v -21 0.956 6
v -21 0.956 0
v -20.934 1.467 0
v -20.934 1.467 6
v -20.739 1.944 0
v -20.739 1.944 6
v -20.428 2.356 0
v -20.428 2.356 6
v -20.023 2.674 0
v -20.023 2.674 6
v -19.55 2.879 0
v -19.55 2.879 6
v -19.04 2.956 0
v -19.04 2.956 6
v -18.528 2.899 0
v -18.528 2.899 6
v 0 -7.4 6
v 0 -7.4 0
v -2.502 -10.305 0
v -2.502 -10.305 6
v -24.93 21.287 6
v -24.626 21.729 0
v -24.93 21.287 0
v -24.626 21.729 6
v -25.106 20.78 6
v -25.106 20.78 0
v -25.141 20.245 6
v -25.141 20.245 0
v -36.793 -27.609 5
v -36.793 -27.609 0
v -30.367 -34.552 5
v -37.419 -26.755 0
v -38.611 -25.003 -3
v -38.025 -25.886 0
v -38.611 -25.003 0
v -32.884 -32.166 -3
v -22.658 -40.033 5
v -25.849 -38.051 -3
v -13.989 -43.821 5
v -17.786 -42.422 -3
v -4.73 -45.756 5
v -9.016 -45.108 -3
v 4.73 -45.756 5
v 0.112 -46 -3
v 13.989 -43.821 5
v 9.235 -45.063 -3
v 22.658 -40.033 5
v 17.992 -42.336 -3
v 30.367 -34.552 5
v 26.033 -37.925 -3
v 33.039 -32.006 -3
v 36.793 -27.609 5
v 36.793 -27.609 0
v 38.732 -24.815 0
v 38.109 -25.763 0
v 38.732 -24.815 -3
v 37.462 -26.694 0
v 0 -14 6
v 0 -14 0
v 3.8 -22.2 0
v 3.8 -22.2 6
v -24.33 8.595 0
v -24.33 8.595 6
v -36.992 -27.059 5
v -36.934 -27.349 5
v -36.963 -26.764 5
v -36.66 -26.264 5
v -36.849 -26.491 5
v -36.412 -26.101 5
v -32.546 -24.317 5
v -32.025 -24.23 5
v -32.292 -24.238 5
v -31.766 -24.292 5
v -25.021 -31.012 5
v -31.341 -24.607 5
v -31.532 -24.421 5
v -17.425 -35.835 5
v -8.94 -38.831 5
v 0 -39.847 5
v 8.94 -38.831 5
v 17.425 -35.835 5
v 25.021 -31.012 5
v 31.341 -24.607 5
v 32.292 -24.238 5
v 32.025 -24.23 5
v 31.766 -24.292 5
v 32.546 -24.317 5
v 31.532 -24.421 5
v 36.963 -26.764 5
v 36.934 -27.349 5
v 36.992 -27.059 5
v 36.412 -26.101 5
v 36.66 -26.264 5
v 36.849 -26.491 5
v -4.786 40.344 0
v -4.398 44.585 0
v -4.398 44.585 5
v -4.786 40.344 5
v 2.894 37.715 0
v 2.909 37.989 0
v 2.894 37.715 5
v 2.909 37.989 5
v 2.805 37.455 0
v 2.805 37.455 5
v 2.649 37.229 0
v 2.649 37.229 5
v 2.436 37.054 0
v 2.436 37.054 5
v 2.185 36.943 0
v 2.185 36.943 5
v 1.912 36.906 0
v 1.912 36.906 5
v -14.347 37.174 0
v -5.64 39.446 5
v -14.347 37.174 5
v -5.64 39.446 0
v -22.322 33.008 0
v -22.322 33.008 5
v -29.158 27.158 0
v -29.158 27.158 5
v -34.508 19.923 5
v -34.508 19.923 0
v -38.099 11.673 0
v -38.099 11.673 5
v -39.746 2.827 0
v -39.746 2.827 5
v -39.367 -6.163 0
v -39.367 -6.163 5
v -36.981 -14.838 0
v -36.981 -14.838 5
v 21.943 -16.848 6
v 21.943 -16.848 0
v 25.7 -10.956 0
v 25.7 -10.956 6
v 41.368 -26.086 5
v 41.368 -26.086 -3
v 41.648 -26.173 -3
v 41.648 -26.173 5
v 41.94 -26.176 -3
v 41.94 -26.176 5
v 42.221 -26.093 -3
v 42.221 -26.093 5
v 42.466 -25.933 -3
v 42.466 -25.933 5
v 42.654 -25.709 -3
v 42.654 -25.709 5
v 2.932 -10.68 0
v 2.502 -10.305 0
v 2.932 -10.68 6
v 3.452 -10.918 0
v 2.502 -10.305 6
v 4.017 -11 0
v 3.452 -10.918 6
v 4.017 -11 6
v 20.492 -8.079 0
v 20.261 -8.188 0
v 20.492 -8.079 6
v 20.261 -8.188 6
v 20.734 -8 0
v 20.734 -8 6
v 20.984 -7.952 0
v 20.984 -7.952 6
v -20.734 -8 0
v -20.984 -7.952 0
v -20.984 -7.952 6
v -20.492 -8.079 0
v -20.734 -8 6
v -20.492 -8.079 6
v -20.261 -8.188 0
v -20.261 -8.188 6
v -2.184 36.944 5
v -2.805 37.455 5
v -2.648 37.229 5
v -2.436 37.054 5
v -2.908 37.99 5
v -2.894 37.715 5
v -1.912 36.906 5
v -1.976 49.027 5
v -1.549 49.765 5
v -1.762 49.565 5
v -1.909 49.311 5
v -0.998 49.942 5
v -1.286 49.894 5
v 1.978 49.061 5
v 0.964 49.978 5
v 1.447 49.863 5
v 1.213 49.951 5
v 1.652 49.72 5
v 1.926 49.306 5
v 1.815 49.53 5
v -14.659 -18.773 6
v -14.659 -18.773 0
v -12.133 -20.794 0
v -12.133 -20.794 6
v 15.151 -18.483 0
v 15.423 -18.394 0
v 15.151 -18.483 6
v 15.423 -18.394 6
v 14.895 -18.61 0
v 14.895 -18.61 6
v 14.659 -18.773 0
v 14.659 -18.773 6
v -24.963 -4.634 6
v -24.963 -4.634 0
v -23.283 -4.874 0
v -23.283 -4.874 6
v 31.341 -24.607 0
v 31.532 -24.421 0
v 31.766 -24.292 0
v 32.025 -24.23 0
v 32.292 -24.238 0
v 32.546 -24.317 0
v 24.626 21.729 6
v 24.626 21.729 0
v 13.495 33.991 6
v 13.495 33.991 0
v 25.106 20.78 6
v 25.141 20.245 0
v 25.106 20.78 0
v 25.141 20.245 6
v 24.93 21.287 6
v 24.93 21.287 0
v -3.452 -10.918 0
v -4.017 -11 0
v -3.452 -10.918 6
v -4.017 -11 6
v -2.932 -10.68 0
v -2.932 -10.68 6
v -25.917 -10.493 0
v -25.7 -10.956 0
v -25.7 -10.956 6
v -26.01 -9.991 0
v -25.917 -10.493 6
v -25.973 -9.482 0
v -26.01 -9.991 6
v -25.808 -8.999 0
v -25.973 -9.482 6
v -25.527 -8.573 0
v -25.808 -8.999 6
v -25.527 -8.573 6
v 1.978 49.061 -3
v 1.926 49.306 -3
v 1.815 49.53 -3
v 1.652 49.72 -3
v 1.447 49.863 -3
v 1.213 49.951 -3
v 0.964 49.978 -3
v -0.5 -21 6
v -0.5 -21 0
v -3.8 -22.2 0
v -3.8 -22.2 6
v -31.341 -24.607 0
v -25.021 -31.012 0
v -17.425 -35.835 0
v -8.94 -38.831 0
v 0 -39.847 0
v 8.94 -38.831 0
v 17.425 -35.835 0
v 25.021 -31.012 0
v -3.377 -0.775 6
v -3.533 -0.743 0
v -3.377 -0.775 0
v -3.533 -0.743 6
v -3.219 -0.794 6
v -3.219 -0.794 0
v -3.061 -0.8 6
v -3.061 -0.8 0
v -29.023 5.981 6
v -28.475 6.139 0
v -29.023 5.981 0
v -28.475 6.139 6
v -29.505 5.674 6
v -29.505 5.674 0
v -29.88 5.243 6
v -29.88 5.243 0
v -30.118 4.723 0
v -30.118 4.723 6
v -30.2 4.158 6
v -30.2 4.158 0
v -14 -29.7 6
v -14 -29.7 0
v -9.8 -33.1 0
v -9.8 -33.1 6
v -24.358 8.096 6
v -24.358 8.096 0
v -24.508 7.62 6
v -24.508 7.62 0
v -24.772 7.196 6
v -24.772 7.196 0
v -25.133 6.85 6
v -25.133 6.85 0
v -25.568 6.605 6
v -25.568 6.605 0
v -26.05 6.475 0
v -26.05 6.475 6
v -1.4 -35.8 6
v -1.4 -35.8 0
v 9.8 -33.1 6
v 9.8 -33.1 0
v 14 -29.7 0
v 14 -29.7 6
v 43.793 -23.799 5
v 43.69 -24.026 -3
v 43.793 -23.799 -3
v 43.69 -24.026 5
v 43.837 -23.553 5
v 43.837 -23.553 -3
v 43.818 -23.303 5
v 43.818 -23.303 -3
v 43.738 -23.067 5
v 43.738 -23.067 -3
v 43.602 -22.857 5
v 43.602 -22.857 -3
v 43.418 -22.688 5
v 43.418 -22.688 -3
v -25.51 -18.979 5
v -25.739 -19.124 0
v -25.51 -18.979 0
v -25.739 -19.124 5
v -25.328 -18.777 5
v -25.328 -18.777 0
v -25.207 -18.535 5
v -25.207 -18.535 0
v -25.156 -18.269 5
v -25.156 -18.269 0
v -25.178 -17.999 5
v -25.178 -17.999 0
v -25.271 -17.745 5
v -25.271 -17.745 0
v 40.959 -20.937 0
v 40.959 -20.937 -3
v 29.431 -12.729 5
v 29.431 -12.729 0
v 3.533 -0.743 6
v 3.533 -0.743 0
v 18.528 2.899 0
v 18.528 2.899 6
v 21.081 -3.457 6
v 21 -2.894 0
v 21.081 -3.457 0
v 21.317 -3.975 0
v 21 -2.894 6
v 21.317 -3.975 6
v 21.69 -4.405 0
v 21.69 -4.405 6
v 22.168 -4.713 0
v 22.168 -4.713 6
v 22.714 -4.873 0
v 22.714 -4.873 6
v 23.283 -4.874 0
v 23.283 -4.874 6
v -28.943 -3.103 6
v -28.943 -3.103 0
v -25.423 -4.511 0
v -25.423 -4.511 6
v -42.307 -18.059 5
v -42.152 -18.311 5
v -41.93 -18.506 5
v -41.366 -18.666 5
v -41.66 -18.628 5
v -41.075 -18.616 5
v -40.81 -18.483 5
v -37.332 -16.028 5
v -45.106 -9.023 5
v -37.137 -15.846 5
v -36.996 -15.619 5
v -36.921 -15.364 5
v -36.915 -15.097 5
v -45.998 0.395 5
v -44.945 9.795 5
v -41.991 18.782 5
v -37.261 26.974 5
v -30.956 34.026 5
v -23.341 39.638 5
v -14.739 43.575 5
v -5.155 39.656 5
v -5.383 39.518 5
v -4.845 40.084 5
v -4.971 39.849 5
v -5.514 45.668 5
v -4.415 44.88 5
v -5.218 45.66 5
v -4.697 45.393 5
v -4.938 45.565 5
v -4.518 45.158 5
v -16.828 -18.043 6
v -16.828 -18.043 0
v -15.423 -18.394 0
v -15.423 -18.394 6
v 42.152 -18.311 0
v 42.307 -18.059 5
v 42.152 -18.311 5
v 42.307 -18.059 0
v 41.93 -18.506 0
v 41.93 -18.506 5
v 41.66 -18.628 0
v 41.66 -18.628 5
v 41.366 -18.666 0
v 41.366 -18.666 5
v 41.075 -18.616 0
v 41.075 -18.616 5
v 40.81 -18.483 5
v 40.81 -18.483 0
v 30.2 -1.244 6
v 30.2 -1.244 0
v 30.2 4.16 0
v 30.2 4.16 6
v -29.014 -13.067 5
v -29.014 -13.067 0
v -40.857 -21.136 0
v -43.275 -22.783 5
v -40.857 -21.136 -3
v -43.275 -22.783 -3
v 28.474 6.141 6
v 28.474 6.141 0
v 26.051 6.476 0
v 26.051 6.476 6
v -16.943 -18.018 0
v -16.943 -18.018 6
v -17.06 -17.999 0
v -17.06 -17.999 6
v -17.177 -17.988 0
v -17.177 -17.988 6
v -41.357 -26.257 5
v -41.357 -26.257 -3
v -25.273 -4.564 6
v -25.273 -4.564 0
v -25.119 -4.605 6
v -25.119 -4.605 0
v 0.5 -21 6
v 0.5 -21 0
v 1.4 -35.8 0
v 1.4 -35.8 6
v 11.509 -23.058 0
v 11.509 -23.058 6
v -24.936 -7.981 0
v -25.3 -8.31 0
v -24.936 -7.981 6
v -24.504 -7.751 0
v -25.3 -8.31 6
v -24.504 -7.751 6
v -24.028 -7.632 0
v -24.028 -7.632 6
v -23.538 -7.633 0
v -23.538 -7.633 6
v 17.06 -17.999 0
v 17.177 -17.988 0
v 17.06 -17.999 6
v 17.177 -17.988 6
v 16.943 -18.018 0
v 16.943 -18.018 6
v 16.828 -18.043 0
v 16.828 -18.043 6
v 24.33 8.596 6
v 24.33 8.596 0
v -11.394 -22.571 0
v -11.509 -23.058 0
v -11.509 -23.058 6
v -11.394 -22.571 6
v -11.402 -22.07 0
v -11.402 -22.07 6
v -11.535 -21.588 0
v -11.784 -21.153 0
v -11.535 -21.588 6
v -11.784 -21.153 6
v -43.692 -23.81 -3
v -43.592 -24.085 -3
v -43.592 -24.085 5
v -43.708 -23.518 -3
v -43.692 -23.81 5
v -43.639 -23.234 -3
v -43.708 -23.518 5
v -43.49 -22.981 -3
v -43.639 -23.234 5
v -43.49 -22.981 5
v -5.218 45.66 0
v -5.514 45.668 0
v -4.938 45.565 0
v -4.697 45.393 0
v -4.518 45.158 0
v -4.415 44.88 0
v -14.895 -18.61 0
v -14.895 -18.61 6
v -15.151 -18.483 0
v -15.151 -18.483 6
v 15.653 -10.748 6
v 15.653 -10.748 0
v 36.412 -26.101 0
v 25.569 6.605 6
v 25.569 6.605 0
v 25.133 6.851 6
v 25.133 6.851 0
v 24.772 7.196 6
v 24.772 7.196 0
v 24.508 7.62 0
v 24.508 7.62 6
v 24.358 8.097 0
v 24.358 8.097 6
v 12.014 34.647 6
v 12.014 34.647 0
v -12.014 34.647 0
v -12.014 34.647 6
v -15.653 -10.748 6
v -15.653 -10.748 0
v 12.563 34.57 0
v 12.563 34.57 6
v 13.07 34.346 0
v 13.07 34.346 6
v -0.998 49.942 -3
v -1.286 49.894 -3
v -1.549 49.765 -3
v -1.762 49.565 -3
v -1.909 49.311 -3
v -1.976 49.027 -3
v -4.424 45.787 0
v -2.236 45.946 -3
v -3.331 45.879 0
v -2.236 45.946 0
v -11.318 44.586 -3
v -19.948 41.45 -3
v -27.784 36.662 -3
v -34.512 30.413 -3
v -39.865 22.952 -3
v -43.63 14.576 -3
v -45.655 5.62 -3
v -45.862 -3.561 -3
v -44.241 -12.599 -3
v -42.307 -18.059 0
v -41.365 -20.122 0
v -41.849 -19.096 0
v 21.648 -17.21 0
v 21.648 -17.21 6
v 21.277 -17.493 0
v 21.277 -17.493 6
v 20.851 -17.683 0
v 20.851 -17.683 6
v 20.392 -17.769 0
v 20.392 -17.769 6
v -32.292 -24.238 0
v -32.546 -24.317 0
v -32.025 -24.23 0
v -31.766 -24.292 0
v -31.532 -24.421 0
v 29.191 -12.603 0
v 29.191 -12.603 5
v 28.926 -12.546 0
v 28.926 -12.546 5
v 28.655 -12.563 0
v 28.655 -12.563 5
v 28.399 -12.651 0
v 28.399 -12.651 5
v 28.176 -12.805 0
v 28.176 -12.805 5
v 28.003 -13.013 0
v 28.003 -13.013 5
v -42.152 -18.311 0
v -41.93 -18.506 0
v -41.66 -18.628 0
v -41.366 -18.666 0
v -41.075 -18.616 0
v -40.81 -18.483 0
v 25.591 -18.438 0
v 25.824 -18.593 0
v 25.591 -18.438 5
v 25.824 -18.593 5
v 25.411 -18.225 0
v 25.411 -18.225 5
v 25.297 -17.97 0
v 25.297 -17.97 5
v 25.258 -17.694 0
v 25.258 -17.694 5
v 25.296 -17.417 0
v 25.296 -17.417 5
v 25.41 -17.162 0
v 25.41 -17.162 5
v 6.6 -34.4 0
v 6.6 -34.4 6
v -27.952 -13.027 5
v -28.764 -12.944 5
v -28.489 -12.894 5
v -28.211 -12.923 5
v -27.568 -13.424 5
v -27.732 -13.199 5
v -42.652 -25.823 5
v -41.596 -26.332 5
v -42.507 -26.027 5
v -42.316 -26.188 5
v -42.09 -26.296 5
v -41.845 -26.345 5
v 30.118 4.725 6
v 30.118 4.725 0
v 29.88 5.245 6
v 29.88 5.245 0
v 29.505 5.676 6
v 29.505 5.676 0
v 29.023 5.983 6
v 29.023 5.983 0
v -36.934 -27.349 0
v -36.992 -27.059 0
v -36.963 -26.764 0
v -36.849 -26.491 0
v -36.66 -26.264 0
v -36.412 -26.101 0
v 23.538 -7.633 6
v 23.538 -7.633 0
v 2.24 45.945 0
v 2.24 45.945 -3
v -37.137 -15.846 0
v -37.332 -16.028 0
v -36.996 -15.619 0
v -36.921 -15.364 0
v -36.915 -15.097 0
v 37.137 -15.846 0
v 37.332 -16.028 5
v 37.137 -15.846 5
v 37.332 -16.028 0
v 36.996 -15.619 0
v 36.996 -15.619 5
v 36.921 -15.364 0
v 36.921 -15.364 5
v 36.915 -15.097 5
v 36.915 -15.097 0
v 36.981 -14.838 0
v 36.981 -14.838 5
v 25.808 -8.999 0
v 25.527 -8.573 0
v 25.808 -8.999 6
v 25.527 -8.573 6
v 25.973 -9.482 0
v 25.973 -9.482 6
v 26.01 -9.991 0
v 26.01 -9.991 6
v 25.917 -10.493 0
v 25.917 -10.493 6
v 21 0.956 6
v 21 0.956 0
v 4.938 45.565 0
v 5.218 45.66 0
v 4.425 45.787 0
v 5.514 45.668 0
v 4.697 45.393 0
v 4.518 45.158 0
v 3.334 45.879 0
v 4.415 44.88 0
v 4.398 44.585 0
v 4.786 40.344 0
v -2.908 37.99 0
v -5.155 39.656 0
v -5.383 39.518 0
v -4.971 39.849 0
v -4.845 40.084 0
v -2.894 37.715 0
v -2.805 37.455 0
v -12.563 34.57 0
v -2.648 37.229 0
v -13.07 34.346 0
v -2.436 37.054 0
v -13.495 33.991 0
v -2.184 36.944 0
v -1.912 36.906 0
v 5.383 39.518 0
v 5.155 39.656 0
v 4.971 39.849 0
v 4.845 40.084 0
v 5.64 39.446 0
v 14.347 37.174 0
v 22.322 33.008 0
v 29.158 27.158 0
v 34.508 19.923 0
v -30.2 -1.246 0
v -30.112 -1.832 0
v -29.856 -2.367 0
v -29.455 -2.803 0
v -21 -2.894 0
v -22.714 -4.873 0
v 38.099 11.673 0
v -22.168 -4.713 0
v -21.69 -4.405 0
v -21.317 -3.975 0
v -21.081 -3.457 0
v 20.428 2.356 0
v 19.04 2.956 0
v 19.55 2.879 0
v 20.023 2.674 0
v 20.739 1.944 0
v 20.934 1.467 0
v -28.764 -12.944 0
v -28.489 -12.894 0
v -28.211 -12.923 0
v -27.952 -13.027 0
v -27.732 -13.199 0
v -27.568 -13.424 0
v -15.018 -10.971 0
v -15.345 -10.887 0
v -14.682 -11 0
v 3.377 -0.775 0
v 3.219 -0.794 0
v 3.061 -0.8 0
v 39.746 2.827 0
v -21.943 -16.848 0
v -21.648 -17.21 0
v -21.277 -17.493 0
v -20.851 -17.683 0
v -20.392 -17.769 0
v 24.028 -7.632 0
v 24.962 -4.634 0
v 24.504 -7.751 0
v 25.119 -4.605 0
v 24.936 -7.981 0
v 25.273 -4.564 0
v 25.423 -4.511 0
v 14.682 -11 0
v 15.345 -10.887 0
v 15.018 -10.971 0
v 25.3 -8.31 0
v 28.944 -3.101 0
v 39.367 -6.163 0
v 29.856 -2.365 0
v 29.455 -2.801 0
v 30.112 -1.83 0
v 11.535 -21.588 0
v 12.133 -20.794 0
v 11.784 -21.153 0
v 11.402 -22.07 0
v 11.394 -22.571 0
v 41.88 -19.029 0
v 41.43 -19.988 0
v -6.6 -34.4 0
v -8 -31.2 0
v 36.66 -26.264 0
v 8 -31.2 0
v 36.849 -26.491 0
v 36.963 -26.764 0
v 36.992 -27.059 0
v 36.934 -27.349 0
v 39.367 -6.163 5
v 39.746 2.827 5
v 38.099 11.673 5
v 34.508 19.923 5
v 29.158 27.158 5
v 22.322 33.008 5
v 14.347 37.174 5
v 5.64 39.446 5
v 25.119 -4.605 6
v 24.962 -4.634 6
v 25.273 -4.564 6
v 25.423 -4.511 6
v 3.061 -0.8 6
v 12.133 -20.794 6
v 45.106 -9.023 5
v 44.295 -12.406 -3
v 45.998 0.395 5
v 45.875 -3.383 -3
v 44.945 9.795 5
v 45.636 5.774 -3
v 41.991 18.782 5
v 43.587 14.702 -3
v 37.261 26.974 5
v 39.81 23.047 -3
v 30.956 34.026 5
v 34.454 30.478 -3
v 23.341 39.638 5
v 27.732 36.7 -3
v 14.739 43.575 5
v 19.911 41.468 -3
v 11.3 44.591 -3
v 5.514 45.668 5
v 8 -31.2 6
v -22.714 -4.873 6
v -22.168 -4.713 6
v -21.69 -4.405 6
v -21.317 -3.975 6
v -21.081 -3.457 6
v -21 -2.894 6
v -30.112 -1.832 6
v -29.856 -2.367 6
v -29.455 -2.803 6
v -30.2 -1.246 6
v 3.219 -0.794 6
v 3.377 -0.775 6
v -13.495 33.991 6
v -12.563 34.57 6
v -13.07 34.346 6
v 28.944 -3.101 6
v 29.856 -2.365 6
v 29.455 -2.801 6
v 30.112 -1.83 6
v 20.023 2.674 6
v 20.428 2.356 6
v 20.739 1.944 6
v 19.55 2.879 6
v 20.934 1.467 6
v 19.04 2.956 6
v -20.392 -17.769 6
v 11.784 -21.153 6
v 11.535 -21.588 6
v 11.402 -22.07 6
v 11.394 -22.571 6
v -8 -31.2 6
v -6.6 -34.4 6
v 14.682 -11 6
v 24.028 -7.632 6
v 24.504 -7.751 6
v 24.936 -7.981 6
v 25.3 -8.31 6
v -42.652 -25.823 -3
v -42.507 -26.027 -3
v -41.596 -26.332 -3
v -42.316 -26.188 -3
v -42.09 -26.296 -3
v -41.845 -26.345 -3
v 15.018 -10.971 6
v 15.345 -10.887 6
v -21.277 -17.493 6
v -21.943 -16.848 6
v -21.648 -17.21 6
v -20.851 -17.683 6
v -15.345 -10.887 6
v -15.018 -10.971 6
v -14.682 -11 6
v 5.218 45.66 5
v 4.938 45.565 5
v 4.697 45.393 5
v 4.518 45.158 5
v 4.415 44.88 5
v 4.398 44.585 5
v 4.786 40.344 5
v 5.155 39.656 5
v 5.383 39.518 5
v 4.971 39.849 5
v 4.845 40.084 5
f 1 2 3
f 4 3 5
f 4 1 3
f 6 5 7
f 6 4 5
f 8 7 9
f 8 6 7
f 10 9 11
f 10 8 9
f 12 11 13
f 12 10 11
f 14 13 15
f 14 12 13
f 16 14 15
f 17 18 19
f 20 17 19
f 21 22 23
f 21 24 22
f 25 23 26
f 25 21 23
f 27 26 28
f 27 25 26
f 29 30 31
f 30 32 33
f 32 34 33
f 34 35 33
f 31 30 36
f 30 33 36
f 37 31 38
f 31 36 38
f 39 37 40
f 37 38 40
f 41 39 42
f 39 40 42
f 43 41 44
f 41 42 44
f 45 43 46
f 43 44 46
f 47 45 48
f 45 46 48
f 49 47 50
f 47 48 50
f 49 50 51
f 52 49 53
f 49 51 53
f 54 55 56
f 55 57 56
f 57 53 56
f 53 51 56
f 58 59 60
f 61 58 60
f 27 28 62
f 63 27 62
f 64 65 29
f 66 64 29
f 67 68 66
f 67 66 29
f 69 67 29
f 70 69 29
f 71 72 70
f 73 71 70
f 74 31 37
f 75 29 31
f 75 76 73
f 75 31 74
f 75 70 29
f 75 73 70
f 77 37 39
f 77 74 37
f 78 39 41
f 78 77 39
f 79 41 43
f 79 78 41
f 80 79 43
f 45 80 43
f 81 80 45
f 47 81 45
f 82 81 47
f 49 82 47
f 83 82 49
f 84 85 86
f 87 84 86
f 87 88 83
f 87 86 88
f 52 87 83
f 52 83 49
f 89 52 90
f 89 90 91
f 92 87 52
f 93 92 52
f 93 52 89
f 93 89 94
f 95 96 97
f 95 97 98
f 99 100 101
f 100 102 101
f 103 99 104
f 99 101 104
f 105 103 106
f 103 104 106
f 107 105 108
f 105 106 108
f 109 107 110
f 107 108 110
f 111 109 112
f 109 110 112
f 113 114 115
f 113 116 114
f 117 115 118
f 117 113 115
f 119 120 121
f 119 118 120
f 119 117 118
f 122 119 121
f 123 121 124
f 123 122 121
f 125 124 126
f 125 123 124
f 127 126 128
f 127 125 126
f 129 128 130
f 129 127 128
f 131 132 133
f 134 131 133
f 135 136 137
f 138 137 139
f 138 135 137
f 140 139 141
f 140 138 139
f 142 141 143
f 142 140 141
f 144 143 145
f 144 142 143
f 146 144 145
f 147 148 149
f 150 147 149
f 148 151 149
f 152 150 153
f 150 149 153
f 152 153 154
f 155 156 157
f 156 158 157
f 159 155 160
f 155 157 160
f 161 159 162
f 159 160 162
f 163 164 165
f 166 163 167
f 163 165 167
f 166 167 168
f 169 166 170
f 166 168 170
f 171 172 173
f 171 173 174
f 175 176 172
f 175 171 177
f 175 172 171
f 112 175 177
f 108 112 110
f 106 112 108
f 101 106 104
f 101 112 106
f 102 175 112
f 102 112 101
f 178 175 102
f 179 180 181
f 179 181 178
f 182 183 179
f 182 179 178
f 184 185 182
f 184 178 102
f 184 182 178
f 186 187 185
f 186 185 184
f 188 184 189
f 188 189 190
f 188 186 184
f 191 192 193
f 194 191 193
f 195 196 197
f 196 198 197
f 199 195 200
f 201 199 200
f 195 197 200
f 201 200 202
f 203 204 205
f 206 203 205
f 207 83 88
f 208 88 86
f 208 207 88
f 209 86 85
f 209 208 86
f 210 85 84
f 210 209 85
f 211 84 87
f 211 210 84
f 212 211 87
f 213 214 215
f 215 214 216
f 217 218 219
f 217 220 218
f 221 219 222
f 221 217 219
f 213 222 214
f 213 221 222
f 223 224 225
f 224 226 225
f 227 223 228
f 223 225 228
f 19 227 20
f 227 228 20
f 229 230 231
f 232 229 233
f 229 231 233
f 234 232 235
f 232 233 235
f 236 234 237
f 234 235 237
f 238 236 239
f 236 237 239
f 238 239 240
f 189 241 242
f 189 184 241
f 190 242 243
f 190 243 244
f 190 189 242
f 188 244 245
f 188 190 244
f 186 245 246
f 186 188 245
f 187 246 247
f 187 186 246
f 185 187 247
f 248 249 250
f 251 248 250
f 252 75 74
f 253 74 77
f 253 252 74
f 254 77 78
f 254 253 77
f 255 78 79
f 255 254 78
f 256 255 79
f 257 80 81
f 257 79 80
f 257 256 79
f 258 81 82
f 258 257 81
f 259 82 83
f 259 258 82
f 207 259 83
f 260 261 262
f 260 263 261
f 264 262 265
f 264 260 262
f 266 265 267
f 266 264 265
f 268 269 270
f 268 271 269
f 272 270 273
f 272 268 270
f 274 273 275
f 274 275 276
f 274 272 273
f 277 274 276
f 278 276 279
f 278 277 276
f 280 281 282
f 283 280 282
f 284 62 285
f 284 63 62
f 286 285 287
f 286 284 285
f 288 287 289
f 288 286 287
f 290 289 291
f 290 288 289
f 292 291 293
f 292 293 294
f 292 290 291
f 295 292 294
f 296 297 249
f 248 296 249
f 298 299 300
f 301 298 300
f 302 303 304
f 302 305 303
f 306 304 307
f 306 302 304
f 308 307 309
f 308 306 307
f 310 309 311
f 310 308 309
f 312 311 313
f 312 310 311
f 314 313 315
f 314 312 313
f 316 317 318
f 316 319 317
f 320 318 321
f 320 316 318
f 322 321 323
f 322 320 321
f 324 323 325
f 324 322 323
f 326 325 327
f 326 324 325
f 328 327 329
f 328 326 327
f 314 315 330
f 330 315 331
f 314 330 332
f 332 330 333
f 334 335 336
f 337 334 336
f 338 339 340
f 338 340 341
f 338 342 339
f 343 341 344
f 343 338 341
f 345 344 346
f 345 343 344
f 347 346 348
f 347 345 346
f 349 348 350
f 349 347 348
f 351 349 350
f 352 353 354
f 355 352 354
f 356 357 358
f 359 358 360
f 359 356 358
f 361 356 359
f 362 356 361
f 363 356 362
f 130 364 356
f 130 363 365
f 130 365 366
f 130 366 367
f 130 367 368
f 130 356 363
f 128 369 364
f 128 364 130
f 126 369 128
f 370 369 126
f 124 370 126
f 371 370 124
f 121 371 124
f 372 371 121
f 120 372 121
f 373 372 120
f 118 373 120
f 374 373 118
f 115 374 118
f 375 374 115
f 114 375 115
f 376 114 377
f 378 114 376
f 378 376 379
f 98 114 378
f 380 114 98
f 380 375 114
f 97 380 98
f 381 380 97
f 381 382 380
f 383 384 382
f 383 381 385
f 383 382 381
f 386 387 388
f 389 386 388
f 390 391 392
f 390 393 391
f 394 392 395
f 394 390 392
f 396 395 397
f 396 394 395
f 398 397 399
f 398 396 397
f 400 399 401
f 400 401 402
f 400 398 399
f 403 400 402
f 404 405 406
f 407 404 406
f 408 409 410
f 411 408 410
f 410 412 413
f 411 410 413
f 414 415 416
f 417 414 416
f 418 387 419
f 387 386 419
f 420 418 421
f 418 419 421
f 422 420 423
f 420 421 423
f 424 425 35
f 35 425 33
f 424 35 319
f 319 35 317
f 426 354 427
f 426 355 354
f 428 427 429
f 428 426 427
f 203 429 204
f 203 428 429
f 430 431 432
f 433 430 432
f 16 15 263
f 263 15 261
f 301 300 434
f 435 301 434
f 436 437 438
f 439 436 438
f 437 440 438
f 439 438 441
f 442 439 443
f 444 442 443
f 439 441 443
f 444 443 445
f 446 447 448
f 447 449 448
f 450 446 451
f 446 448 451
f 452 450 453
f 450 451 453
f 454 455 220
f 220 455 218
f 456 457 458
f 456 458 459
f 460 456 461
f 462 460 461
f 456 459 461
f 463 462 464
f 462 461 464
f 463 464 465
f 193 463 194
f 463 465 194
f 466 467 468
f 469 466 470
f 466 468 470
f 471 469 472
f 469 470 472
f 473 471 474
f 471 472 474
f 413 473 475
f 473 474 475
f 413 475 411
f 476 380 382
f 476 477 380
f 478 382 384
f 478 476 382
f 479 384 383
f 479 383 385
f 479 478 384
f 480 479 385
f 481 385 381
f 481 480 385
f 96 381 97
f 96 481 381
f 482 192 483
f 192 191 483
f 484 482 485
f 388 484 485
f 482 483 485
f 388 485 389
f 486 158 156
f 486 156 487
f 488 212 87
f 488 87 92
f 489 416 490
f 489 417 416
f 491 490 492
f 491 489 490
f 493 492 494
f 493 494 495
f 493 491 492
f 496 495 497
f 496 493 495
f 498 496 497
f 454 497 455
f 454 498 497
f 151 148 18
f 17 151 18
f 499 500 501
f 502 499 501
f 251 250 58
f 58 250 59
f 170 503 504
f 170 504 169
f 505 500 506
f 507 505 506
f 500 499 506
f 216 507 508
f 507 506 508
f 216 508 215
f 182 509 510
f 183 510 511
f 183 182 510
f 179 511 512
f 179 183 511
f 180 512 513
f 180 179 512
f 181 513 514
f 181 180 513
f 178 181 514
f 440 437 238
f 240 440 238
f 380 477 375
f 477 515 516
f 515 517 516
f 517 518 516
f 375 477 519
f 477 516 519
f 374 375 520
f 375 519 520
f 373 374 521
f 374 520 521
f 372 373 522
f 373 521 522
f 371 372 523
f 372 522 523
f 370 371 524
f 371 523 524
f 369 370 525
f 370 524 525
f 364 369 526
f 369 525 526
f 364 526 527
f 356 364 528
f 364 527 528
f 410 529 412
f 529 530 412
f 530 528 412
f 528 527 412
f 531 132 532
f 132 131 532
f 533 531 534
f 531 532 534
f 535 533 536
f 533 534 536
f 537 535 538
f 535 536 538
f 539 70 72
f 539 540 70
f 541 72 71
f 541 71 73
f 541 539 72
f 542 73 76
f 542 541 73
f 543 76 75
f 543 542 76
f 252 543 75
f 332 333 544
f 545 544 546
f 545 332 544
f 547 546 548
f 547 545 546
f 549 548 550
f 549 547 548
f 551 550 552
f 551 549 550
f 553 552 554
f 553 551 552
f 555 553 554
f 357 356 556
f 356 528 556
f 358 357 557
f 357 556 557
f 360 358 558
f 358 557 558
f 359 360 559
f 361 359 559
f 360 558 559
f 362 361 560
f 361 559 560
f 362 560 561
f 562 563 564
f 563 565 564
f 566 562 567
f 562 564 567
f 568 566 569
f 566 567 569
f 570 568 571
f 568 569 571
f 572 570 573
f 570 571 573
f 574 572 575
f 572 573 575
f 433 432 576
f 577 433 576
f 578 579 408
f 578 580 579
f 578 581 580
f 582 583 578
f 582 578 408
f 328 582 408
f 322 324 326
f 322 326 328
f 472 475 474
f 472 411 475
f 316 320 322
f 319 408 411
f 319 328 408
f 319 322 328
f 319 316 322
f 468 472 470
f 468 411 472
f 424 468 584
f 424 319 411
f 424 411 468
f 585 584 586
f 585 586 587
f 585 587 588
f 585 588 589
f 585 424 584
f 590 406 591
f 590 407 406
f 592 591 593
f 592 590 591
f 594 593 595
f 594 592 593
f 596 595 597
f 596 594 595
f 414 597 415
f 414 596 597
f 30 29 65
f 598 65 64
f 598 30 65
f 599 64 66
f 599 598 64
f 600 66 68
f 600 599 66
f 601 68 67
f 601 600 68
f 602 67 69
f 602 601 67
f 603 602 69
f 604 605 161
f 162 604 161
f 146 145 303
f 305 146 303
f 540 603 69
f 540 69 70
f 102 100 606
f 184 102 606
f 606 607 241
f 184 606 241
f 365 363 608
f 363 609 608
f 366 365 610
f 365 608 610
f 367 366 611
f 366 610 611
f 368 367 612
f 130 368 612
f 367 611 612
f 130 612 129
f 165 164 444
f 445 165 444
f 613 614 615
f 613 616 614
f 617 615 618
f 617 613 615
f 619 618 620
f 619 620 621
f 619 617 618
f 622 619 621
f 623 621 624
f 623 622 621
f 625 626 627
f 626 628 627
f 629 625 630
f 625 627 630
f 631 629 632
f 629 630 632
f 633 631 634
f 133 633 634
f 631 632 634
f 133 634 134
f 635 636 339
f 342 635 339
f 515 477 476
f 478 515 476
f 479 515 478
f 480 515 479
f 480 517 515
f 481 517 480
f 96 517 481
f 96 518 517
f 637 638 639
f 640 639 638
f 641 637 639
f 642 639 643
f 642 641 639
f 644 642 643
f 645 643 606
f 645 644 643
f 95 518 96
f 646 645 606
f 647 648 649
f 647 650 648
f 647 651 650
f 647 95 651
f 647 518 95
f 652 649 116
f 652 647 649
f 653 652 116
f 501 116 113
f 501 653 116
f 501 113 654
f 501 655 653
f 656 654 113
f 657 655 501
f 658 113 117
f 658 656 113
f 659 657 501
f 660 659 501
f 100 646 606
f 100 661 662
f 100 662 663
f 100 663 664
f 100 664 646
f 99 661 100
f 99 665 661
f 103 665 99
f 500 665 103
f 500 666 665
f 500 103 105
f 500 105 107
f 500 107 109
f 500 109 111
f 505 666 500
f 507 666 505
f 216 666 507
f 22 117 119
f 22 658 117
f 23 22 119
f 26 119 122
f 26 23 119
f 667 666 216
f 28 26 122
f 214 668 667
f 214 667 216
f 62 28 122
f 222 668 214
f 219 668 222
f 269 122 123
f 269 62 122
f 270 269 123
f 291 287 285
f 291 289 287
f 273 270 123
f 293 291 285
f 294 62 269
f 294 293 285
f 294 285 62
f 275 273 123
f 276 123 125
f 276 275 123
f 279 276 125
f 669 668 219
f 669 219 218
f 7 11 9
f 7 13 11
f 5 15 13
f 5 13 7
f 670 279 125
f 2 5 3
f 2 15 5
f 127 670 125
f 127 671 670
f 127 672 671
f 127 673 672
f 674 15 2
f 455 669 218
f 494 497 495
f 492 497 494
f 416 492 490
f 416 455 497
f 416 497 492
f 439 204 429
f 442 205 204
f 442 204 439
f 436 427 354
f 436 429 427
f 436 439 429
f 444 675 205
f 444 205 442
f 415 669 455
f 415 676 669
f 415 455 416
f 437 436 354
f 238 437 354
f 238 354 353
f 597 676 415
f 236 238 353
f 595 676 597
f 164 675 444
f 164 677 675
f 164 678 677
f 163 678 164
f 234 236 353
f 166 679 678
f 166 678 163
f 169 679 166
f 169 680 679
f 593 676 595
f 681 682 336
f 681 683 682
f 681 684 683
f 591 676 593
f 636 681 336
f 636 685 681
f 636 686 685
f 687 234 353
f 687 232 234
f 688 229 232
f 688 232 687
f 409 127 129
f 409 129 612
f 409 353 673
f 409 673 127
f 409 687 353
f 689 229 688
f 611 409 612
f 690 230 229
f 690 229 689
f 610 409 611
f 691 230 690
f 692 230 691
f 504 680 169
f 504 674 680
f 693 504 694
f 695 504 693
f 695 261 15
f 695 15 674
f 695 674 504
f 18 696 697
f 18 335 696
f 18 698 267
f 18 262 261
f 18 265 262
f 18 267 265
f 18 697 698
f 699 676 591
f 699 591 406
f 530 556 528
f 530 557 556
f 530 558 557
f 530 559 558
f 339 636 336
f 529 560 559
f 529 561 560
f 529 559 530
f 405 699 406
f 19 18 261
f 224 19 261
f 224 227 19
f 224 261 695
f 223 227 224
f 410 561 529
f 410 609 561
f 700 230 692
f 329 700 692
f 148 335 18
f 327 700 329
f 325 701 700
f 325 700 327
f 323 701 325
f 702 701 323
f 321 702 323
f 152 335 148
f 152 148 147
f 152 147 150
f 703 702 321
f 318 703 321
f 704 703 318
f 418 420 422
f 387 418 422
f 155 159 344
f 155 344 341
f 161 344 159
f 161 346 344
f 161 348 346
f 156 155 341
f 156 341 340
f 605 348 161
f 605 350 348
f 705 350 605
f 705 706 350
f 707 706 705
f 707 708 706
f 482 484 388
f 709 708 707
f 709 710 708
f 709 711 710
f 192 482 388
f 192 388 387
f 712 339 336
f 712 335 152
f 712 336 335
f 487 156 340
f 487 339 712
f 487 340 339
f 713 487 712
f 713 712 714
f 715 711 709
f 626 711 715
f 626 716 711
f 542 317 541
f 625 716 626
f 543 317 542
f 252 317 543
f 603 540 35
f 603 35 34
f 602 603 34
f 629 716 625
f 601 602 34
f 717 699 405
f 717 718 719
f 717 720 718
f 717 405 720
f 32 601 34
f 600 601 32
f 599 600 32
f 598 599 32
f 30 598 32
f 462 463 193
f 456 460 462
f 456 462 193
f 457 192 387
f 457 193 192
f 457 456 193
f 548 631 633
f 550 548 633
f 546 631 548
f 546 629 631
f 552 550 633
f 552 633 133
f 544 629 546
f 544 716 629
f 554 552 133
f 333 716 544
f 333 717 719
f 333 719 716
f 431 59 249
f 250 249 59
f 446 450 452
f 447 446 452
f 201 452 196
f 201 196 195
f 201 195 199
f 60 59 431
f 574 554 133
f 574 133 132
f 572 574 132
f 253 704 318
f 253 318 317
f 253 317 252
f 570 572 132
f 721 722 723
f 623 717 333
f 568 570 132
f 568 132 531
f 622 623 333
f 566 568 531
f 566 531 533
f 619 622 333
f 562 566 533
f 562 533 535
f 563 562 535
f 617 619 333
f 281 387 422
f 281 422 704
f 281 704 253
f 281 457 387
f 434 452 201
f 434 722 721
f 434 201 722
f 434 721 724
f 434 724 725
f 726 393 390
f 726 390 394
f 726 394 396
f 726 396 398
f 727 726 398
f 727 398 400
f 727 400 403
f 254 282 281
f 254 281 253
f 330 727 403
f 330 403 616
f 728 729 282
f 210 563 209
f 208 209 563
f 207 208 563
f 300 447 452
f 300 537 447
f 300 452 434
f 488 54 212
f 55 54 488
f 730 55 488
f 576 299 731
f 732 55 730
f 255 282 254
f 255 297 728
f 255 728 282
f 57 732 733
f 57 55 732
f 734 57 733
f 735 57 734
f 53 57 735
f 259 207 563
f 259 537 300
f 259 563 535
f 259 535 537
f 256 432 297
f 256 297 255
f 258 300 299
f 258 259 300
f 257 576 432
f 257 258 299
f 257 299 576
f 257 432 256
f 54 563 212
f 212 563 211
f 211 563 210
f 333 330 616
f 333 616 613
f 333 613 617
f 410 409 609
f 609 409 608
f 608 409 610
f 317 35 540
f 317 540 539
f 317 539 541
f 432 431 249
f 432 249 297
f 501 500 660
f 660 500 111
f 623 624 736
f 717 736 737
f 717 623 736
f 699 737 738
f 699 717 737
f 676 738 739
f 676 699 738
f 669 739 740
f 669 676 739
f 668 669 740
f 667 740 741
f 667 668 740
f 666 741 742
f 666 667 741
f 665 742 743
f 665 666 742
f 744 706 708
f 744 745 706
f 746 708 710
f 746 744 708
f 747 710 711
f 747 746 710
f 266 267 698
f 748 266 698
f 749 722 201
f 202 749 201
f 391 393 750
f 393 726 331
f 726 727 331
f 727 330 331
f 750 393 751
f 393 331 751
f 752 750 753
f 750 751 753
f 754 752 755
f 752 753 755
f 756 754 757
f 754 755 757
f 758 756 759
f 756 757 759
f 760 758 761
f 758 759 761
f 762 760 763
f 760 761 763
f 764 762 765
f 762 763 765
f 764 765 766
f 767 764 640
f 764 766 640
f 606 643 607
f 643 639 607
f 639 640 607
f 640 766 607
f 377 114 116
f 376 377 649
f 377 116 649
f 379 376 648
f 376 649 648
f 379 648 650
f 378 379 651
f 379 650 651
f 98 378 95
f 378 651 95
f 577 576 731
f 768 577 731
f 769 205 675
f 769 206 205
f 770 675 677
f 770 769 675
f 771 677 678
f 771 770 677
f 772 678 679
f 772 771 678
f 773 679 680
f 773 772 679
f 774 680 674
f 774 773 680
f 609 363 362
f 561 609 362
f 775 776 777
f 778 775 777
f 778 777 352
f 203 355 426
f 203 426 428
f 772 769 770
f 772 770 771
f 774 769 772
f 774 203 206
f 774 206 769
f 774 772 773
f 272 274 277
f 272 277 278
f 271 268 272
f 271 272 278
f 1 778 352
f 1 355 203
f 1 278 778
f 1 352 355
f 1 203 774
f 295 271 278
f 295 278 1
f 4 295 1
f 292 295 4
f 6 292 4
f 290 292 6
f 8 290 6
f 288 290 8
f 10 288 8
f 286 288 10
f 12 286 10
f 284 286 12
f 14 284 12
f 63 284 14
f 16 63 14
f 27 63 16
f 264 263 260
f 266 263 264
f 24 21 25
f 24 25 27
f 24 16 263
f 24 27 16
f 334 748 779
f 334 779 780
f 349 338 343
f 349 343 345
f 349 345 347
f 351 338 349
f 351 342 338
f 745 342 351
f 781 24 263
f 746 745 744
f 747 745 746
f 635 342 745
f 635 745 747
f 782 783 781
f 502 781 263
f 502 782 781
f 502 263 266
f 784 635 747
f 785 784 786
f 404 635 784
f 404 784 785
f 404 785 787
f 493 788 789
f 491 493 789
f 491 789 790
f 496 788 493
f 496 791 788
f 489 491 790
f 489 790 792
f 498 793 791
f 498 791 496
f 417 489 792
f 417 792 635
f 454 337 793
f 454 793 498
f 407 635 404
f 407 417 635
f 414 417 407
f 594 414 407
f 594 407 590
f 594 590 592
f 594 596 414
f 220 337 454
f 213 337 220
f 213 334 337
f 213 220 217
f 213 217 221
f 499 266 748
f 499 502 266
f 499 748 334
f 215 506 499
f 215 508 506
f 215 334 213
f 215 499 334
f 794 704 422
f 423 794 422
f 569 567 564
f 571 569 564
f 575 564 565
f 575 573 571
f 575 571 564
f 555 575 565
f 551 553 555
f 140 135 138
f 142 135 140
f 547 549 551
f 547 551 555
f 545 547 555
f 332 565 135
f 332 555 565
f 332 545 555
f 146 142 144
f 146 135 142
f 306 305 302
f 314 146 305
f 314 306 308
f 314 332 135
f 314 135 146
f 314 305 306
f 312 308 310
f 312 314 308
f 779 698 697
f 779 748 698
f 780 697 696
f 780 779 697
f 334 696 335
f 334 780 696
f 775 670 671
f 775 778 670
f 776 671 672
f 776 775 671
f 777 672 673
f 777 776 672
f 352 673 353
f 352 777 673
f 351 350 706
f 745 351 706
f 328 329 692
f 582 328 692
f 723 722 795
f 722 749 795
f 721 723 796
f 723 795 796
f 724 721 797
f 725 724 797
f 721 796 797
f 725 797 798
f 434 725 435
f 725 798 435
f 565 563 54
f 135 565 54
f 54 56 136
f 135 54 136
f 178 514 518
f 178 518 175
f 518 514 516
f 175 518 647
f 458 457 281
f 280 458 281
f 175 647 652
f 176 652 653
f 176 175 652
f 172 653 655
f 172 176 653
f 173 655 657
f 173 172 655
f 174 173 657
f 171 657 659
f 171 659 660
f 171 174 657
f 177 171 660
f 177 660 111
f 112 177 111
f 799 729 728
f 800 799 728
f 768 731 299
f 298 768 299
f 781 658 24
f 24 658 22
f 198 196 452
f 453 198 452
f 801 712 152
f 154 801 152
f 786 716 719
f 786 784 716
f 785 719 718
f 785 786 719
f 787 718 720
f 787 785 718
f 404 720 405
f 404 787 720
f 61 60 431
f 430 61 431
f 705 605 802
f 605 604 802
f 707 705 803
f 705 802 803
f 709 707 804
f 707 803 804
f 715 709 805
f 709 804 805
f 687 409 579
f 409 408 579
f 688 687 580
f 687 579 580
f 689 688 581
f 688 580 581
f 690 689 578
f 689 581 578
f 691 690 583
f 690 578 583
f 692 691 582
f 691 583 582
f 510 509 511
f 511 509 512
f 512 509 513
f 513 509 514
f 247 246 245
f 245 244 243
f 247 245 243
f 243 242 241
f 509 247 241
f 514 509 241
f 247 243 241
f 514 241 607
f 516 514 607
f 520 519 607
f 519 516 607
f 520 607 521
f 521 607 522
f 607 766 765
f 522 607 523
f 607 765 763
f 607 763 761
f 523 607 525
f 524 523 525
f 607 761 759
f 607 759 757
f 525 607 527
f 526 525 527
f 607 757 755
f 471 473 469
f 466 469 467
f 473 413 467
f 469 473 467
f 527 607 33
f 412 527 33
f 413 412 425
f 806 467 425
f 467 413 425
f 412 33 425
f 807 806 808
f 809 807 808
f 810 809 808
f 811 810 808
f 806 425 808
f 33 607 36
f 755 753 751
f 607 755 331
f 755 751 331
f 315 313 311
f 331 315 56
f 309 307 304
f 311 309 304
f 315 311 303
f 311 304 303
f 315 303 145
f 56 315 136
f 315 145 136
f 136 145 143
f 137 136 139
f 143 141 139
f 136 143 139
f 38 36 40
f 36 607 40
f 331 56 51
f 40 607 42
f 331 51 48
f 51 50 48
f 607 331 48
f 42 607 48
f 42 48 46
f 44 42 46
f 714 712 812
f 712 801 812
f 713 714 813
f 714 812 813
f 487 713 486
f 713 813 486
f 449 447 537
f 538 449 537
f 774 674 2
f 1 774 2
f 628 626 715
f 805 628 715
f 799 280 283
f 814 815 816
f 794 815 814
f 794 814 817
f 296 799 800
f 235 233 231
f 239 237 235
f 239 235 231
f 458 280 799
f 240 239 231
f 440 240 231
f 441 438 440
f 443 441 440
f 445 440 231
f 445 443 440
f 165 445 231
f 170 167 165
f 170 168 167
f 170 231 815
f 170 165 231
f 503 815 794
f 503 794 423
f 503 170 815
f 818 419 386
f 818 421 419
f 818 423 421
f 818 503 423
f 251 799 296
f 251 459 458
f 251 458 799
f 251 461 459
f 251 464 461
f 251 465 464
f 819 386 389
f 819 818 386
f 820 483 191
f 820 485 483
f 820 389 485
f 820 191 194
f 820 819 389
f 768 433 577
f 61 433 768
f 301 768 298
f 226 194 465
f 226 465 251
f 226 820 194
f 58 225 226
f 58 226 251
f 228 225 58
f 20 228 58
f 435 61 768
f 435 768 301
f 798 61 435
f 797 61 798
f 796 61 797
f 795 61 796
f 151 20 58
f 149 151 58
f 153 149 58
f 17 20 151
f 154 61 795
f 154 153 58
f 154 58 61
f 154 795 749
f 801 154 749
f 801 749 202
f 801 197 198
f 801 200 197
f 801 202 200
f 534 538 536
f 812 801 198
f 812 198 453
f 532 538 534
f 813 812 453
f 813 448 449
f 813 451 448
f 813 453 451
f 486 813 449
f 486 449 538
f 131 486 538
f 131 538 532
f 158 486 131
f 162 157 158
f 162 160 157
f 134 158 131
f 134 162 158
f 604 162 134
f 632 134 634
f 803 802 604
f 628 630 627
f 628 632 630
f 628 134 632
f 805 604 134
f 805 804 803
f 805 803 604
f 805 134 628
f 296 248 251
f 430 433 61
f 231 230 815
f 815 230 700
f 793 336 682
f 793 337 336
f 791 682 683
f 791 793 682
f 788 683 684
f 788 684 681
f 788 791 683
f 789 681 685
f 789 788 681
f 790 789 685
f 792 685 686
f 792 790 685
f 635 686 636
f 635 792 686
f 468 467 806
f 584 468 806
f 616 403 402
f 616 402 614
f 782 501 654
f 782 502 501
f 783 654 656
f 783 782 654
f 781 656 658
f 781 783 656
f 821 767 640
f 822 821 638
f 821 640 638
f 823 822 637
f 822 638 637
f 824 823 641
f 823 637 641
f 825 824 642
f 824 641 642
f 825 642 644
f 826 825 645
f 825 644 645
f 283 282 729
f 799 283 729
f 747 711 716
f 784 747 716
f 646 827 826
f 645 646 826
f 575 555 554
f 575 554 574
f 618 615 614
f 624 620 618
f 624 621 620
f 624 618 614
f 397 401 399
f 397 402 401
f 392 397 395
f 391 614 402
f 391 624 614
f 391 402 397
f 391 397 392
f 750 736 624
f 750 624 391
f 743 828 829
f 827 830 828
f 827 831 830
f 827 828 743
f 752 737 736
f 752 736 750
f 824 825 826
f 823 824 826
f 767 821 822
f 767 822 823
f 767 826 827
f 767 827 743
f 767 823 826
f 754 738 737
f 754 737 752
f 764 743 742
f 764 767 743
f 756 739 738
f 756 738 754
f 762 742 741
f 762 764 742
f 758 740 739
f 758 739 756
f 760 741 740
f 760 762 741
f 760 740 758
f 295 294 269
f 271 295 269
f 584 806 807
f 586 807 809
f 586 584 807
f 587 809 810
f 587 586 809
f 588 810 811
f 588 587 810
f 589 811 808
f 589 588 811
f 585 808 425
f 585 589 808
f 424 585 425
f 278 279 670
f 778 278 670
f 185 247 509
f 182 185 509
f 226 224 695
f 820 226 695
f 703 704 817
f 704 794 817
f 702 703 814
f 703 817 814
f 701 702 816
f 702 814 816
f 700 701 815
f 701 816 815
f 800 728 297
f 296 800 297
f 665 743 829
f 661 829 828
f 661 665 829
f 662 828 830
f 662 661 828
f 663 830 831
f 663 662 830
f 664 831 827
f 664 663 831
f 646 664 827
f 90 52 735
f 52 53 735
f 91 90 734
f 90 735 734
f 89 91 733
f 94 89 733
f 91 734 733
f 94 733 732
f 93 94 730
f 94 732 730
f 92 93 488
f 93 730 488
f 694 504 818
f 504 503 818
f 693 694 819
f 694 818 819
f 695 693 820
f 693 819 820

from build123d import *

# Parameters (mm, degrees)
F1_R      = 46
F2_DEPTH  = 8
F3_R      = 39.8466862326
F4_DEPTH  = 6
F7_DEPTH  = 25
F9_ANGLE  = 120
F10_ANGLE = 120
F13_DEPTH = 8
F15_DEPTH = 8
F16_ANGLE = 120
F18_DEPTH = 6
F20_DEPTH = 6
F21_R     = 1
F22_R     = 2
F23_R     = 2


with BuildPart() as f2:
    # F1 (on offset) → F2 (new body)
    with BuildSketch(Plane.XY.offset(-3)):
        Circle(F1_R)
    extrude(amount=F2_DEPTH)


with BuildPart() as f4:
    # F3 (on Top) → F4 (new body)
    with BuildSketch(Plane.XY):
        Circle(F3_R)
    extrude(amount=F4_DEPTH)


with BuildPart() as f2_1:
    add(f2.part)

    # F5: cut F4
    add(f4.part, mode=Mode.SUBTRACT)


with BuildPart() as f7:
    # F6 (on Top) → F7 (new body)
    with BuildSketch(Plane.XY):
        Polygon((4.2, 46.7533776755), (-4.2, 46.7533776755), (-5, 38), (5, 38), align=None)
    extrude(amount=F7_DEPTH)


with BuildPart() as f9_1:
    # F9: copy of F7
    add(f7.part.rotate(Axis((0, 0, 3.5398988872), (0, 0, -1)), F9_ANGLE))


with BuildPart() as f10_1:
    # F10: copy of F9_1
    add(f9_1.part.rotate(Axis((0, 0, 3.5398988872), (0, 0, -1)), F10_ANGLE))


with BuildPart() as f2_2:
    add(f2_1.part)

    # F11: cut F10_1, F9_1, F7
    add(f10_1.part, mode=Mode.SUBTRACT)
    add(f9_1.part, mode=Mode.SUBTRACT)
    add(f7.part, mode=Mode.SUBTRACT)



with BuildPart() as f13:
    # F12 (on offset) → F13 (new body)
    with BuildSketch(Plane.XY.offset(-3)):
        Polygon((1.9, 49.994420498), (-1.9, 49.925893195), (-3, 36.9057094163), (3, 36.9057094163), align=None)
    extrude(amount=F13_DEPTH)


with BuildPart() as f15:
    # F14 (on offset) → F15 (new body)
    with BuildSketch(Plane.XY.offset(-3)):
        Polygon((42.1813093126, -26.4778193086), (44.179931283, -23.2300590724), (28.5657010972, -12.1127264574), (24.8182862997, -18.1085914373), align=None)
    extrude(amount=F15_DEPTH)


with BuildPart() as f16_1:
    # F16: copy of F15
    add(f15.part.rotate(Axis((0, 0, 3.5398988872), (0, 0, -1)), F16_ANGLE))


with BuildPart() as f18:
    # F17 (on Top) → F18 (new body)
    with BuildSketch(Plane.XY):
        Polygon((25.2, 21.096765488), (12.9, 34.6466732368), (-12.9, 34.6466732368), (-25.2, 21.096765488), (-24.2, 6.7315296738), (-30.2, 5.9), (-30.2, -2.6), (-25.2, -4.6), (-21, -5.2), (-21, 3.5), (-3.3, -0.8), (3.3, -0.8), (21, 3.5), (21, -5.2), (25.2, -4.6), (30.2, -2.5974751513), (30.2, 5.9025248487), (24.2, 6.7315296738), align=None)
    extrude(amount=F18_DEPTH)


with BuildPart() as f2_3:
    add(f2_2.part)

    add(f13.part)  # F20 merges F13

    add(f15.part)  # F20 merges F15

    add(f16_1.part)  # F20 merges F16_1

    add(f18.part)  # F20 merges F18
    # F19 (on Top) → F20 (join)
    with BuildSketch(Plane.XY):
        Polygon((3.1, -11), (0, -7.4), (-3.1, -11), (-15.2, -11), (-20.6, -8), (-24.6, -7.5), (-26.5, -9.7), (-21.4, -17.7), (-17, -18), (-15, -18.5), (-11, -21.7), (-14, -29.7), (-9.8, -33.1), (-8, -31.2), (-6.6, -34.4), (-1.4, -35.8), (-0.5, -21), (-3.8, -22.2), (0, -14), (3.8, -22.2), (0.5, -21), (1.4, -35.8), (6.6, -34.4), (8, -31.2), (9.8, -33.1), (14, -29.7), (11, -21.7), (15, -18.5), (17, -18), (21.4, -17.7), (26.5, -9.7), (24.6, -7.5), (20.6, -8), (15.2, -11), align=None)
    extrude(amount=F20_DEPTH)

    # F21
    f21_edges = [f2_3.edges().sort_by_distance(p)[0] for p in [
        (1.9, 49.99442, 1),
        (-1.9, 49.925893, 1),
        (3, 36.905709, 2.5),
        (-3, 36.905709, 2.5),
        (-28.091643, -12.438971, 2.5),
        (-44.021119, -23.291176, 1),
        (-42.207787, -26.645913, 1),
        (-24.772779, -18.68226, 2.5),
        (24.818286, -18.108591, 2.5),
        (28.565701, -12.112726, 2.5),
        (42.181309, -26.477819, 1),
        (44.179931, -23.230059, 1),
        (37.520202, -26.612675, 2.5),
        (41.807353, -19.18711, 2.5),
        (36.679976, -15.567202, 2.5),
        (31.82158, -23.98219, 2.5),
        (4.287152, 45.799785, 2.5),
        (-4.287152, 45.799785, 2.5),
        (-4.858396, 39.549392, 2.5),
        (4.858396, 39.549392, 2.5),
        (-41.807353, -19.18711, 2.5),
        (-37.520202, -26.612675, 2.5),
        (-36.679976, -15.567202, 2.5),
        (-31.82158, -23.98219, 2.5),
    ]]
    fillet(f21_edges, radius=F21_R)

    # F22
    f22_edges = [f2_3.edges().sort_by_distance(p)[0] for p in [
        (30.2, 5.902525, 3),
        (30.2, -2.597475, 3),
        (24.2, 6.73153, 3),
        (25.2, 21.096765, 3),
        (12.9, 34.646673, 3),
        (-12.9, 34.646673, 3),
        (-25.2, 21.096765, 3),
        (-24.2, 6.73153, 3),
        (-30.2, 5.9, 3),
        (-30.2, -2.6, 3),
        (-25.2, -4.6, 3),
        (-21, -5.2, 3),
        (-21, 3.5, 3),
        (-3.3, -0.8, 3),
        (3.3, -0.8, 3),
        (21, 3.5, 3),
        (21, -5.2, 3),
        (25.2, -4.6, 3),
    ]]
    fillet(f22_edges, radius=F22_R)

    # F23
    f23_edges = [f2_3.edges().sort_by_distance(p)[0] for p in [
        (26.5, -9.7, 3),
        (21.4, -17.7, 3),
        (17, -18, 3),
        (15, -18.5, 3),
        (11, -21.7, 3),
        (-11, -21.7, 3),
        (-15, -18.5, 3),
        (-17, -18, 3),
        (-21.4, -17.7, 3),
        (-26.5, -9.7, 3),
        (-24.6, -7.5, 3),
        (-20.6, -8, 3),
        (-15.2, -11, 3),
        (-3.1, -11, 3),
        (3.1, -11, 3),
        (15.2, -11, 3),
        (20.6, -8, 3),
        (24.6, -7.5, 3),
    ]]
    fillet(f23_edges, radius=F23_R)


with BuildPart() as f24_1:
    # F24: copy of F2
    add(f2_3.part)


solid = f2_3.part
